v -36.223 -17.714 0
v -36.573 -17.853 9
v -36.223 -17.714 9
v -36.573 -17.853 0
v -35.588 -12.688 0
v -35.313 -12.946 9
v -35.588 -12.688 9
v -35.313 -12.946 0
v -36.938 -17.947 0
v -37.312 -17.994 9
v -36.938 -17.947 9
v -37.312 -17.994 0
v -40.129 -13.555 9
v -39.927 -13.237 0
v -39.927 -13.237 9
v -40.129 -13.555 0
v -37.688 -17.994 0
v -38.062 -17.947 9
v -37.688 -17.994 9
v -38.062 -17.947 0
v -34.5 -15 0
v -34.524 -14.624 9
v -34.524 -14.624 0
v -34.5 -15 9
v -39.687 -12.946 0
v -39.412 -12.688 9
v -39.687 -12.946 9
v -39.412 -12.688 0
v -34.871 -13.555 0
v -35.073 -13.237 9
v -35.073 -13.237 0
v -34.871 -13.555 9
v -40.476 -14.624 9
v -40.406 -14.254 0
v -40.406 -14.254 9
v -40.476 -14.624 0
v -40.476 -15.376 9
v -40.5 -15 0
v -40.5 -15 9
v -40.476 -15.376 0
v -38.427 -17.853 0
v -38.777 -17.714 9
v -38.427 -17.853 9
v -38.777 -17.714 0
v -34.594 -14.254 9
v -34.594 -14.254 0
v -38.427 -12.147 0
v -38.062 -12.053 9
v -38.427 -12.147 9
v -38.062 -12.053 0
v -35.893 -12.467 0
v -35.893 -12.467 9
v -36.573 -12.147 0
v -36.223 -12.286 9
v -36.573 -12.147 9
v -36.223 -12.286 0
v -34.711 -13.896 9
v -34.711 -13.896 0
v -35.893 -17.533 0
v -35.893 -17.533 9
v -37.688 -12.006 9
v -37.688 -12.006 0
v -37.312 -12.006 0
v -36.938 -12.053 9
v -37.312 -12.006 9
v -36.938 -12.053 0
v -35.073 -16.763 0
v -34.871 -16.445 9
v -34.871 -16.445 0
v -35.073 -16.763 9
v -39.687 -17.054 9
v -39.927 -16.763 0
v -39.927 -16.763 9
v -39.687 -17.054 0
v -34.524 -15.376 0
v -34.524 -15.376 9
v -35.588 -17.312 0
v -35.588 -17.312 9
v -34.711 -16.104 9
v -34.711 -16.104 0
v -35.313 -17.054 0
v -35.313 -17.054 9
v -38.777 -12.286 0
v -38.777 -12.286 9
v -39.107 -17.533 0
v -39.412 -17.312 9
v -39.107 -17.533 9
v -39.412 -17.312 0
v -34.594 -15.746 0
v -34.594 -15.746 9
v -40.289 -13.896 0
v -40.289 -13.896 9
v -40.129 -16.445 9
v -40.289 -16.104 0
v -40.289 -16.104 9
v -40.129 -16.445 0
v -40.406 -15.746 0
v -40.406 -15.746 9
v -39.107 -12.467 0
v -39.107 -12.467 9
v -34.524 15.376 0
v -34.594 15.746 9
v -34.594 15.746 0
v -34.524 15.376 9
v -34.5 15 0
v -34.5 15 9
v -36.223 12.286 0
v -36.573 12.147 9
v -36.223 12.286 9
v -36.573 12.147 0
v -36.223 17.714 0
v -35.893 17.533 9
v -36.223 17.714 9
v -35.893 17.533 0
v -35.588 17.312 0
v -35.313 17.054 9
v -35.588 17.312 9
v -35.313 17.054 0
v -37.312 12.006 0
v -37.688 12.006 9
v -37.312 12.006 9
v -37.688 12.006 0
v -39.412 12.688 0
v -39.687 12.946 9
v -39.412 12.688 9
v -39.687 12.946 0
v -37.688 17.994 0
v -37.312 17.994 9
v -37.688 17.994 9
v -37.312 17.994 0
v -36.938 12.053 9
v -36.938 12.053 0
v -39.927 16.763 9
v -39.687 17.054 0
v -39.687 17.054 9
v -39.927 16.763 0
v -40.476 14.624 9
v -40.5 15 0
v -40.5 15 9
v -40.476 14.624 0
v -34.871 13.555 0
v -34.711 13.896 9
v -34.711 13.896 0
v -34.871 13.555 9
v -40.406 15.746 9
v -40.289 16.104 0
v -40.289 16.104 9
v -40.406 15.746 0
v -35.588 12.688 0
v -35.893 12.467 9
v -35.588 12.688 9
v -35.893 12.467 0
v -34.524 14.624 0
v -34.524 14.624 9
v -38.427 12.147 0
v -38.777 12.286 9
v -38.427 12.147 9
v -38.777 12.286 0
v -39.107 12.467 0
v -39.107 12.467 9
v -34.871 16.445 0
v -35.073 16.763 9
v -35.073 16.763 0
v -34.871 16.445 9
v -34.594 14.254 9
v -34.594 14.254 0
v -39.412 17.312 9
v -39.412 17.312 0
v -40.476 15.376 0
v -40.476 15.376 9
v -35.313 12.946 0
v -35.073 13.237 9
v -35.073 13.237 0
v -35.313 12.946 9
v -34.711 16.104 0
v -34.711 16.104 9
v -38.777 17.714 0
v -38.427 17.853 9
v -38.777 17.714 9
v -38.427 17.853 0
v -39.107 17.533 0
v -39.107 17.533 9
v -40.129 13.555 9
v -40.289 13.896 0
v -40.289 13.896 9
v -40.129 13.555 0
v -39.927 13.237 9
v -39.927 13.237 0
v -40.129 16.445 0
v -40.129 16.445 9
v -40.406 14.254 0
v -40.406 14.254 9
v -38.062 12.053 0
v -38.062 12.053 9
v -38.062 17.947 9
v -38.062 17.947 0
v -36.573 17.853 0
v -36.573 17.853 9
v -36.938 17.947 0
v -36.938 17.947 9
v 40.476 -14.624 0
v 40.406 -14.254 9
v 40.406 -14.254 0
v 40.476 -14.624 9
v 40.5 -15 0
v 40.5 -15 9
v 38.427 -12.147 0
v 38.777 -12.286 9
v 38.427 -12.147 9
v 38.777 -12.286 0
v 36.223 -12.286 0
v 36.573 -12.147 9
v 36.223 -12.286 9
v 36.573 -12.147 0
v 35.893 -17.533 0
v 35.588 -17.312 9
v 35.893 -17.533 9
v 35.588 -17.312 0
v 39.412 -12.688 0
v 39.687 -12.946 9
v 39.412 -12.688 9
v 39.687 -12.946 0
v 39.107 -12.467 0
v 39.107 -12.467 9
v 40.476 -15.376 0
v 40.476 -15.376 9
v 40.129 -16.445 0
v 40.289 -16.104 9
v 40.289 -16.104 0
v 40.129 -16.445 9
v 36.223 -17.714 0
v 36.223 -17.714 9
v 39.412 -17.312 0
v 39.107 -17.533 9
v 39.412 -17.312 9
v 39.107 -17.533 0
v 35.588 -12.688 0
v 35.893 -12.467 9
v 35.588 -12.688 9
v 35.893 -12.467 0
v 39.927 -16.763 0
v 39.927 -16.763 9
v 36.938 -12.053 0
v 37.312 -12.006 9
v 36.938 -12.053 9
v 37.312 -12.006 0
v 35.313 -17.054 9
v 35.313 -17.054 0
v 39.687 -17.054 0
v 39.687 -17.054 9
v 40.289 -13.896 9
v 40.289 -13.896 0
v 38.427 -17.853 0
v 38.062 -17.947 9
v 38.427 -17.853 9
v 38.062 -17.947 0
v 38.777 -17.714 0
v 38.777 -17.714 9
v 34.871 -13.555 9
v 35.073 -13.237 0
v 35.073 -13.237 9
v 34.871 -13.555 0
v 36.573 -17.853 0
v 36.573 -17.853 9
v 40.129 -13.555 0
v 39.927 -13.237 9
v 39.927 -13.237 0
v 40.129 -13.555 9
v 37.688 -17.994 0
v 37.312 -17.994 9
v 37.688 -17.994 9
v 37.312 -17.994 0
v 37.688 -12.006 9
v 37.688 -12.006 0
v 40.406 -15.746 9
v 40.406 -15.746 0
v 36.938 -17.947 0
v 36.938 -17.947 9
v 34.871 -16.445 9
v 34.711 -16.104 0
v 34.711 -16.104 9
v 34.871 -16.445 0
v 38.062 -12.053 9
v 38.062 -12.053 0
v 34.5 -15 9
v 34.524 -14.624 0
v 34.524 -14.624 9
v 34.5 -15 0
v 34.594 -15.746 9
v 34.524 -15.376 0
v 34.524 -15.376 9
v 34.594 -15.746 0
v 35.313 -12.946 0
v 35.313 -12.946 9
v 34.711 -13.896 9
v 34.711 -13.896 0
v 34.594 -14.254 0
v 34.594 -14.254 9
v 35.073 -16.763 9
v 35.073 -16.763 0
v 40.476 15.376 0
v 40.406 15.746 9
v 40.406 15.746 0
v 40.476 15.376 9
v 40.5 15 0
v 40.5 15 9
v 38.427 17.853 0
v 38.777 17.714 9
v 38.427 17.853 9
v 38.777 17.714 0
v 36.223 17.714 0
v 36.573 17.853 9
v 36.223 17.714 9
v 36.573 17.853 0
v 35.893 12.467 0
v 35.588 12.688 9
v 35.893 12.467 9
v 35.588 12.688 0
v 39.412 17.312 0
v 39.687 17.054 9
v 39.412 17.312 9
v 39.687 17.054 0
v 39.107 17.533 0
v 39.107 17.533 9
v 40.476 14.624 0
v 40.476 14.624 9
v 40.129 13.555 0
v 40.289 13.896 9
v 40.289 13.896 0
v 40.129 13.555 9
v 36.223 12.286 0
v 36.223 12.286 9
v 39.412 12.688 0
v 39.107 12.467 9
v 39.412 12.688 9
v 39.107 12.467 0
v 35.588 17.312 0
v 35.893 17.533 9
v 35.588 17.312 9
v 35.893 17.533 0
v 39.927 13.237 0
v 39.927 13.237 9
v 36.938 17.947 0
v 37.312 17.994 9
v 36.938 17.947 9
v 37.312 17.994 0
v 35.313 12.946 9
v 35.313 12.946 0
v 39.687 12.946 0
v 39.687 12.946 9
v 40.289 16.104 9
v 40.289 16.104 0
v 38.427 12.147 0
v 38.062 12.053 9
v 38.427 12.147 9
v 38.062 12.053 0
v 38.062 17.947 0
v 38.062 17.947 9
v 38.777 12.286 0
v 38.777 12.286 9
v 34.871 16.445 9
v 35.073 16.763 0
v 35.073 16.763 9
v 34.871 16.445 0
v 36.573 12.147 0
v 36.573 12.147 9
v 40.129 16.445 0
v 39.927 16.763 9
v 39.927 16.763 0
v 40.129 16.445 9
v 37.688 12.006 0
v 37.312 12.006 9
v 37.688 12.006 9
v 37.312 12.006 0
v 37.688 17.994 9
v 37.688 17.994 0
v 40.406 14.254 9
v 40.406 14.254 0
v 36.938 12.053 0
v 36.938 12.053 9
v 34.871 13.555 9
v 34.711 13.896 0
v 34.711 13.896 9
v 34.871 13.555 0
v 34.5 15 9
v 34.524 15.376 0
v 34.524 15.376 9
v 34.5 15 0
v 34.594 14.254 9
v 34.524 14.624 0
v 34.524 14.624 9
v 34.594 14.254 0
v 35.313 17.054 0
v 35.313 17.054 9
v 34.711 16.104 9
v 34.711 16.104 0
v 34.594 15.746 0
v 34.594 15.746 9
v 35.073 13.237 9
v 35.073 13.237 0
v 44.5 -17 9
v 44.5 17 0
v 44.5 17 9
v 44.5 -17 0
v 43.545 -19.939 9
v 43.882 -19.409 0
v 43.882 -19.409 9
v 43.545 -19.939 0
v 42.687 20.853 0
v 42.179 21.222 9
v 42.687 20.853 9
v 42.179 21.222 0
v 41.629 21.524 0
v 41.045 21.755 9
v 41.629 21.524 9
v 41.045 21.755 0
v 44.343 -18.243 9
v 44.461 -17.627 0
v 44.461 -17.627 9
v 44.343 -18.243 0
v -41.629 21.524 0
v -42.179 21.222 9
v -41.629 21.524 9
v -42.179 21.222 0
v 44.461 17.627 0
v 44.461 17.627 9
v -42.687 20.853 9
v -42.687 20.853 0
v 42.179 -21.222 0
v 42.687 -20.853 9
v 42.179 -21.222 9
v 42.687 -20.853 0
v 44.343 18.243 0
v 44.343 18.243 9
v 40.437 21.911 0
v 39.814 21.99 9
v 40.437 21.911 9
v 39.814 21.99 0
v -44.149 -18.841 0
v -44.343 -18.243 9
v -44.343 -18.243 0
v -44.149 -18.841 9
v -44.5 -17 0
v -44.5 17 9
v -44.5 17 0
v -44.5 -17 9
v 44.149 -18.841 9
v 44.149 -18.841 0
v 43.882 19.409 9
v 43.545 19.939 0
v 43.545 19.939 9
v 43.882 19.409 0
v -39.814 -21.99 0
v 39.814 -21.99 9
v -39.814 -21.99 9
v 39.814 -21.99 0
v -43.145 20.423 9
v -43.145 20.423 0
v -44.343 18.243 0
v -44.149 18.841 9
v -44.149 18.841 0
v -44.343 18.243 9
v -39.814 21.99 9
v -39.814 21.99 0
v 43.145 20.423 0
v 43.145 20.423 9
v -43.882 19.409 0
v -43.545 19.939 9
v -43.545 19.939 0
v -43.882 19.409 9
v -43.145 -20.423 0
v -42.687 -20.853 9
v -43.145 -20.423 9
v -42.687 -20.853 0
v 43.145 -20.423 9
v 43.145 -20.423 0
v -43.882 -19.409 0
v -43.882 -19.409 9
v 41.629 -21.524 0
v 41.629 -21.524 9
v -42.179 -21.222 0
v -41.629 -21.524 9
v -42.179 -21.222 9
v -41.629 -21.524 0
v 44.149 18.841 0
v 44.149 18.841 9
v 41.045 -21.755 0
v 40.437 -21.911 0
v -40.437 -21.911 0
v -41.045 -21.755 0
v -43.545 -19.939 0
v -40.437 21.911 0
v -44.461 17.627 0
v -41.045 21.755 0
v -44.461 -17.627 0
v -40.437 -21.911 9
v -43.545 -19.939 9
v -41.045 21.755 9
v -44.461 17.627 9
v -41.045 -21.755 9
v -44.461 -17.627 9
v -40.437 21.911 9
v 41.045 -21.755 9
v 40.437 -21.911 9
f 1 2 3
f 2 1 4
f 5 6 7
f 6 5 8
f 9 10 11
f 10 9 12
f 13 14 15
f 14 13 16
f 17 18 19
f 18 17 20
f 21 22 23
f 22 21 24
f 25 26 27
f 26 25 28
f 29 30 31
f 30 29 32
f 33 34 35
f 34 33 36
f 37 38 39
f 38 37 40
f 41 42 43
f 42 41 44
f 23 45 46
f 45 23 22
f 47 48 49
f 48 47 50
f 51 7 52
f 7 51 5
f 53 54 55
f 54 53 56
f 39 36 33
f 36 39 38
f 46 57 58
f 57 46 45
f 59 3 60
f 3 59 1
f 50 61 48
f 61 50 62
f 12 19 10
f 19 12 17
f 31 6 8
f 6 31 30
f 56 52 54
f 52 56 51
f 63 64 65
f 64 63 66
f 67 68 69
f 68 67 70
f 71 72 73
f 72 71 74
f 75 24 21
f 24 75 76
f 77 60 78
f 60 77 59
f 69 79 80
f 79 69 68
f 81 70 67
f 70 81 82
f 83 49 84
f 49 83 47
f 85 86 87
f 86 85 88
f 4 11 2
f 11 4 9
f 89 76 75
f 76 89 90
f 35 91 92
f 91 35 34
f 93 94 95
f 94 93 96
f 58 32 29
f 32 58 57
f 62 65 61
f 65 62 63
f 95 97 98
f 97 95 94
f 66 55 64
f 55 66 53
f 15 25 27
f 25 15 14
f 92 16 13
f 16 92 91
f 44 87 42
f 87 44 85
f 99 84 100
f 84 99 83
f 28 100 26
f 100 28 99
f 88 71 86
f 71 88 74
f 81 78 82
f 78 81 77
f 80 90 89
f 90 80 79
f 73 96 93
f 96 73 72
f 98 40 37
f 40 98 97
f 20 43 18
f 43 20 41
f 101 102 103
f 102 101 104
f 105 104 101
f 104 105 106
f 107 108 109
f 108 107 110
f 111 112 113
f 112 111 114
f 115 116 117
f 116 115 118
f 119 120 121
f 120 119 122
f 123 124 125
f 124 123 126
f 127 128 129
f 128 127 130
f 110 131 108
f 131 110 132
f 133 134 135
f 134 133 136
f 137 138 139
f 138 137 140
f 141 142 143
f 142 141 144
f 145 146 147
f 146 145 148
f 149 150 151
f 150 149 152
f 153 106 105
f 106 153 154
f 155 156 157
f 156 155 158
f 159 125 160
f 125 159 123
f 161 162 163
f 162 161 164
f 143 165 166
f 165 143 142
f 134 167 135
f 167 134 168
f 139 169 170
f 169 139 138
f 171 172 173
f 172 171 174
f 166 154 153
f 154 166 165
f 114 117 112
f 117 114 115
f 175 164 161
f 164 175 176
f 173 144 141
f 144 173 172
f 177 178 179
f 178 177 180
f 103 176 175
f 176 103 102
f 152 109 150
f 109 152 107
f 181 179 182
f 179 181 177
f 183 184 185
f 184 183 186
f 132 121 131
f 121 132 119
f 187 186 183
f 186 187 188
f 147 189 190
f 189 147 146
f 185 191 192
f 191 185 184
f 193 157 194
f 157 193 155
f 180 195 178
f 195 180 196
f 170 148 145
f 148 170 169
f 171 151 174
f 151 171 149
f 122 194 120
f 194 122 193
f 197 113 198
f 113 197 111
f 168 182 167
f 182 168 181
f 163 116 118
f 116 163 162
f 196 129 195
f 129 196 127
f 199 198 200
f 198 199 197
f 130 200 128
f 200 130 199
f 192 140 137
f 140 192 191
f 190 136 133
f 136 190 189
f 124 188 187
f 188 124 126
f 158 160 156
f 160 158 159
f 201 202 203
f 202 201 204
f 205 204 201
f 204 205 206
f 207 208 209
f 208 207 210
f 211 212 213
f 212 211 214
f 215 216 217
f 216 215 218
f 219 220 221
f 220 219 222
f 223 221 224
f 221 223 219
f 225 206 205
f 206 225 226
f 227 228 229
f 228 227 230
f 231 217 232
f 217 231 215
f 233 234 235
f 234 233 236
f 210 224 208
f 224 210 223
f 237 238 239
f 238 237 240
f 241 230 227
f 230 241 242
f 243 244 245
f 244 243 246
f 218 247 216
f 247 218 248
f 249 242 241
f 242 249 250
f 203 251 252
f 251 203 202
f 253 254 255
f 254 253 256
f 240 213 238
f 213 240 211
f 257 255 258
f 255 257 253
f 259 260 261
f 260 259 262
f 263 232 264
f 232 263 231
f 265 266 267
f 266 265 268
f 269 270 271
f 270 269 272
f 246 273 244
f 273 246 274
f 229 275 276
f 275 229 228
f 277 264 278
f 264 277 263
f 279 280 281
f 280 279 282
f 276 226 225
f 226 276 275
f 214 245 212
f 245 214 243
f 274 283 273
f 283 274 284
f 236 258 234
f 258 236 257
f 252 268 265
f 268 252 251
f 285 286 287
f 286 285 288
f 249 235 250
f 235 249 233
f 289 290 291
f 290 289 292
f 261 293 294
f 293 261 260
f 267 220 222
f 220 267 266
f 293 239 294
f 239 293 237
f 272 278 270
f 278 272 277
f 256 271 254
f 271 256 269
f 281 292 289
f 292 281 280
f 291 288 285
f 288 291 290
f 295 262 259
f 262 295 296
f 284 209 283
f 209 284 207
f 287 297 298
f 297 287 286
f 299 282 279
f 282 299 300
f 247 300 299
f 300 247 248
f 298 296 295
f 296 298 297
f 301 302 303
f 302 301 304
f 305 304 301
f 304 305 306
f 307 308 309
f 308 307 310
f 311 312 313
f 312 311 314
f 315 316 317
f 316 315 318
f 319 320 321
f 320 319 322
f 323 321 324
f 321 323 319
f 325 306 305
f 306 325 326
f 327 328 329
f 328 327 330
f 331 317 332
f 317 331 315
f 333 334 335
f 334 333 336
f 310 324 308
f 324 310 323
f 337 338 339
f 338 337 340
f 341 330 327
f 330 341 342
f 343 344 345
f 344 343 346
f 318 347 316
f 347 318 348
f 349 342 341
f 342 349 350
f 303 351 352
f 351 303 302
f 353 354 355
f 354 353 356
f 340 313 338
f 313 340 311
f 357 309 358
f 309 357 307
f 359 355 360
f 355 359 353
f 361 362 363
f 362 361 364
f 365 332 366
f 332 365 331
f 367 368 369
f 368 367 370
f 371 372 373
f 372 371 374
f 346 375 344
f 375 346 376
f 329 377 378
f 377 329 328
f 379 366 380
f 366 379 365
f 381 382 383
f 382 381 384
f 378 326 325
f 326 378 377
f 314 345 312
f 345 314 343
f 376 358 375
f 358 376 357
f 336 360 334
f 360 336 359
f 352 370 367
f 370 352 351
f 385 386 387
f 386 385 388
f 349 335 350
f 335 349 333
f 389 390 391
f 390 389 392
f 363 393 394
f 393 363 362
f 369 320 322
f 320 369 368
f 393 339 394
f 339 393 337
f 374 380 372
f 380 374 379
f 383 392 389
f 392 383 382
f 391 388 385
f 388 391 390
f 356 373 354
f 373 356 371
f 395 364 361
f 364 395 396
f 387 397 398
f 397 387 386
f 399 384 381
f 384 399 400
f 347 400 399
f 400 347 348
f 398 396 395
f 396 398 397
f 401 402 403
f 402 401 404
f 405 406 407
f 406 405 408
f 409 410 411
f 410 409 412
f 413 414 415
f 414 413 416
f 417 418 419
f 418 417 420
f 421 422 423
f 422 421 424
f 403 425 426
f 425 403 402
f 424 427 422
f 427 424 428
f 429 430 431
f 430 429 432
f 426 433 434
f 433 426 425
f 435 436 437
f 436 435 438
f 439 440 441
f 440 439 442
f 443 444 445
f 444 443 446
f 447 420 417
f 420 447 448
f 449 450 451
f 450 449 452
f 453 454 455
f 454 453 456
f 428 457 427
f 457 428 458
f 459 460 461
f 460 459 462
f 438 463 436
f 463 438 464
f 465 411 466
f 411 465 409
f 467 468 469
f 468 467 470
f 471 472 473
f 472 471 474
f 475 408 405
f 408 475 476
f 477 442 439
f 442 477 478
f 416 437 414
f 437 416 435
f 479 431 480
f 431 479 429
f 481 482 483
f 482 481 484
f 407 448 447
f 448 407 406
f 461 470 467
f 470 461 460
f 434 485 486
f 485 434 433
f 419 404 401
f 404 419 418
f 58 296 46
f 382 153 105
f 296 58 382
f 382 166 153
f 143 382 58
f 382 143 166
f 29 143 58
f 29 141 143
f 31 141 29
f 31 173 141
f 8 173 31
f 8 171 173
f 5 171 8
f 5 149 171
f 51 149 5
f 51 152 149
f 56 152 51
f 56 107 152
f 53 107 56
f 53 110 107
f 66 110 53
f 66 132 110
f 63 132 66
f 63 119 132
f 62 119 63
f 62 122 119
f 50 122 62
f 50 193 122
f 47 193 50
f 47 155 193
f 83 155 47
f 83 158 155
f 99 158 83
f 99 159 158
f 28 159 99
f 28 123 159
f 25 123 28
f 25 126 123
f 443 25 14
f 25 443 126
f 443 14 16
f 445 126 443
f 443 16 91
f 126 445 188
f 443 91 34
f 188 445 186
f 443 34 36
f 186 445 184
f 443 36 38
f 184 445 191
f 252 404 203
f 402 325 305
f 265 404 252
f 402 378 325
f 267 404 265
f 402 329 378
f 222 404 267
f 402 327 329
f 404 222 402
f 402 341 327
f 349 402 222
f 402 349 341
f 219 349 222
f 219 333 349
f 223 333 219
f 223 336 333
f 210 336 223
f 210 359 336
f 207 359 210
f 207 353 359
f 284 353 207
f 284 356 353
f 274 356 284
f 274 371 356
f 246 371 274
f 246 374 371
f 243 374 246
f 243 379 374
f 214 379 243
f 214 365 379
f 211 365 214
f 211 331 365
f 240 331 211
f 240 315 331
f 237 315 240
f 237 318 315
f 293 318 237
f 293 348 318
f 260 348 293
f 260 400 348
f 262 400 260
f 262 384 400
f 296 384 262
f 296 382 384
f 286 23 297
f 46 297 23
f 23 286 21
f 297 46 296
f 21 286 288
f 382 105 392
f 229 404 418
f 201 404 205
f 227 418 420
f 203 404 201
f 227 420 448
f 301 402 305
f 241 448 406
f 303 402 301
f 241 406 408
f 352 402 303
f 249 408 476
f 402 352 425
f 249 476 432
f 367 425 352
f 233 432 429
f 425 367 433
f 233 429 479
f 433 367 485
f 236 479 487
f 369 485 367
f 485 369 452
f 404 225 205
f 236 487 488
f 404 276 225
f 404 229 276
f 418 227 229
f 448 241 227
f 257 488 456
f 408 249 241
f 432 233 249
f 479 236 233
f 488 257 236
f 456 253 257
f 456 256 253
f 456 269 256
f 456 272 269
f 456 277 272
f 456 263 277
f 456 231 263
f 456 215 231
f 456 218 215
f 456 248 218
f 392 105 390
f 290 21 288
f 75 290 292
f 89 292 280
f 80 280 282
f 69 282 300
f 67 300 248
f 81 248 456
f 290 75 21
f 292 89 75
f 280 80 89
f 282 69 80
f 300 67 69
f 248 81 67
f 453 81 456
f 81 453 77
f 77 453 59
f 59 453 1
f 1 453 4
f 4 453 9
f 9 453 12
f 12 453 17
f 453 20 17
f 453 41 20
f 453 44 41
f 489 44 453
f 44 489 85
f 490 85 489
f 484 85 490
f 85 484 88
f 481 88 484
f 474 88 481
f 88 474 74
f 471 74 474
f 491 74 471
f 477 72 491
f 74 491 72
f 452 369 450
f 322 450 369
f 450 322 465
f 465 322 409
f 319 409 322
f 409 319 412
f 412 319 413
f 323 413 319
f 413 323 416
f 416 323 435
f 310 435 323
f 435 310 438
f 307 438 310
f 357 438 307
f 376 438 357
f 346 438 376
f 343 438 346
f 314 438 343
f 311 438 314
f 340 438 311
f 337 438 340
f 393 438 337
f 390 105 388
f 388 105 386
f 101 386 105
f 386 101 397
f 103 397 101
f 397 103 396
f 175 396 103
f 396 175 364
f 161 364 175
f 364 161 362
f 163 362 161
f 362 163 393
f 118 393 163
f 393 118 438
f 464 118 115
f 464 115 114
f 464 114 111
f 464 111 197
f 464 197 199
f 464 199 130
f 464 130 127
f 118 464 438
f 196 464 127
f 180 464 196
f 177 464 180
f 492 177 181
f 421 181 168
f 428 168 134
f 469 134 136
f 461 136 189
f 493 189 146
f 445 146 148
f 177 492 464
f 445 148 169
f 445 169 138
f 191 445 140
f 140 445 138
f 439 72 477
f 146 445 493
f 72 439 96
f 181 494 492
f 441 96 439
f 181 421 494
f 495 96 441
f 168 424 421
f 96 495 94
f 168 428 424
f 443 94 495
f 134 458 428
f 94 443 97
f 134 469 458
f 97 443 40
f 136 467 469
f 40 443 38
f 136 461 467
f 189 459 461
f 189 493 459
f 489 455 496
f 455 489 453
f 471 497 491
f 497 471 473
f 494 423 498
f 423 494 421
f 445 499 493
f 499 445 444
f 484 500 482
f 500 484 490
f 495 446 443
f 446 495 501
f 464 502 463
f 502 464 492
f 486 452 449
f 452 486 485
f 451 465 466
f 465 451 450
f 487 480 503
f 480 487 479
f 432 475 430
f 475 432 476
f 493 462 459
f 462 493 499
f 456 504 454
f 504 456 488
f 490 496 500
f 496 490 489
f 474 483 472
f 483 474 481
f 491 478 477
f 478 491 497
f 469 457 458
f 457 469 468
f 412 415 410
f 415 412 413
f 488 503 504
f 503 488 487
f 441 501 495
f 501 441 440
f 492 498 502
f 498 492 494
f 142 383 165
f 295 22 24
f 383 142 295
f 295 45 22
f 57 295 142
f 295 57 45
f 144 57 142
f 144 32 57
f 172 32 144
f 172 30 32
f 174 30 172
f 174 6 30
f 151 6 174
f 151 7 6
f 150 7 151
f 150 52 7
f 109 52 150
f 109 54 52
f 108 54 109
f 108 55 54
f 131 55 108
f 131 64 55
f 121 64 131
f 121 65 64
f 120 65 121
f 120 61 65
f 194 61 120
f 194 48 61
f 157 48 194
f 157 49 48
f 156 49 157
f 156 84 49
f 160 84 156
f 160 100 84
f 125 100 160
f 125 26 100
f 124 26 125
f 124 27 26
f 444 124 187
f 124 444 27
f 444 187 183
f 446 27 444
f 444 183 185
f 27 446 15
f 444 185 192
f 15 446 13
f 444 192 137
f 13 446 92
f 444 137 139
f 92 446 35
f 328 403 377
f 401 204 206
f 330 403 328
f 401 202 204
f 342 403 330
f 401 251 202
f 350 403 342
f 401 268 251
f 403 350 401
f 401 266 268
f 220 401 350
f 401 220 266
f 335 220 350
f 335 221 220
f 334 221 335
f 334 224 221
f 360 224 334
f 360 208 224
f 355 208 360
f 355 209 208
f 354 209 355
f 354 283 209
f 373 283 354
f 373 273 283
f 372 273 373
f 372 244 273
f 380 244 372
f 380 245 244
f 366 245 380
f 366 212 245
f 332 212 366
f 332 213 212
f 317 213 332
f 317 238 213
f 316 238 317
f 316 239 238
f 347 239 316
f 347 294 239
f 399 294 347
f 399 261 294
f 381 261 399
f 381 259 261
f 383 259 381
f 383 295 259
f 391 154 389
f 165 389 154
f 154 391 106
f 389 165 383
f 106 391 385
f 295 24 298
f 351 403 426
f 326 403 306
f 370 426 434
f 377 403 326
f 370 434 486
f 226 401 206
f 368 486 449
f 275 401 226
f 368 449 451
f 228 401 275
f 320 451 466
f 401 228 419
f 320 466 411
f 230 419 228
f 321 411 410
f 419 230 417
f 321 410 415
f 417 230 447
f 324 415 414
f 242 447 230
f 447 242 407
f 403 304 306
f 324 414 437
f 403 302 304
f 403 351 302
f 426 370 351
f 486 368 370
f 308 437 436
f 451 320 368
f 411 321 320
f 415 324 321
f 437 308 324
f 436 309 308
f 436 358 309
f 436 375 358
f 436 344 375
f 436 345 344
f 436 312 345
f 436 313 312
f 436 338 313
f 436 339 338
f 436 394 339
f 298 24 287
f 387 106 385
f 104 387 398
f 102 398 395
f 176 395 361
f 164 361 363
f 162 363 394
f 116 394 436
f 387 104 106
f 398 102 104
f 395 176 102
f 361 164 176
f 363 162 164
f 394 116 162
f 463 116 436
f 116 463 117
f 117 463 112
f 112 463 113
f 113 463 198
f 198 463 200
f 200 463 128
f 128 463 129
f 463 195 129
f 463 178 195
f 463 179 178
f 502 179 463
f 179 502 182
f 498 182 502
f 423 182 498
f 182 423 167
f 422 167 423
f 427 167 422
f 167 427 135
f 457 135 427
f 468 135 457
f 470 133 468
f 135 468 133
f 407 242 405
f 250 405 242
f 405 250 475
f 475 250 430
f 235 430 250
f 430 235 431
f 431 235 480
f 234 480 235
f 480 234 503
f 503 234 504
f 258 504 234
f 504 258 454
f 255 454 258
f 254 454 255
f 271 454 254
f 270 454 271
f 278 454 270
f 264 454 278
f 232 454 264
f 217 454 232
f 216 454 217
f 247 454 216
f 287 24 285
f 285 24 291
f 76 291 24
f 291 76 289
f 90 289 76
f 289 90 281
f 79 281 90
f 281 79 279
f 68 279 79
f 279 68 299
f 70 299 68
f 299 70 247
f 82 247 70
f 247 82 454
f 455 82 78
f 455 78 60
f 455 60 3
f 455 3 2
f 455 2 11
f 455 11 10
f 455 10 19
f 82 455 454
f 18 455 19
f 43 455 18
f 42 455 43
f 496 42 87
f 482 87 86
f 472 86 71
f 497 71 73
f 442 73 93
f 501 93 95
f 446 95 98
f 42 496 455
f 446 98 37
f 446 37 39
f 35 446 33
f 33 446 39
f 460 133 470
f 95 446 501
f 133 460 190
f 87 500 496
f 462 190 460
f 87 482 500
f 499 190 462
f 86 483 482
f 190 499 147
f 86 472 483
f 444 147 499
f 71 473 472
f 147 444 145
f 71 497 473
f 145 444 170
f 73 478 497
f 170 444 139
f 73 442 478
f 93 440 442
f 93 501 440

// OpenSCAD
$fn = 50;


difference() {
	union() {
		hull() {
			translate(v = [-39.5000000000, 17.0000000000, 0]) {
				cylinder(h = 9, r = 5);
			}
			translate(v = [39.5000000000, 17.0000000000, 0]) {
				cylinder(h = 9, r = 5);
			}
			translate(v = [-39.5000000000, -17.0000000000, 0]) {
				cylinder(h = 9, r = 5);
			}
			translate(v = [39.5000000000, -17.0000000000, 0]) {
				cylinder(h = 9, r = 5);
			}
		}
	}
	union() {
		translate(v = [-37.5000000000, -15.0000000000, -100.0000000000]) {
			cylinder(h = 200, r = 3.0000000000);
		}
		translate(v = [-37.5000000000, 15.0000000000, -100.0000000000]) {
			cylinder(h = 200, r = 3.0000000000);
		}
		translate(v = [37.5000000000, -15.0000000000, -100.0000000000]) {
			cylinder(h = 200, r = 3.0000000000);
		}
		translate(v = [37.5000000000, 15.0000000000, -100.0000000000]) {
			cylinder(h = 200, r = 3.0000000000);
		}
	}
}
